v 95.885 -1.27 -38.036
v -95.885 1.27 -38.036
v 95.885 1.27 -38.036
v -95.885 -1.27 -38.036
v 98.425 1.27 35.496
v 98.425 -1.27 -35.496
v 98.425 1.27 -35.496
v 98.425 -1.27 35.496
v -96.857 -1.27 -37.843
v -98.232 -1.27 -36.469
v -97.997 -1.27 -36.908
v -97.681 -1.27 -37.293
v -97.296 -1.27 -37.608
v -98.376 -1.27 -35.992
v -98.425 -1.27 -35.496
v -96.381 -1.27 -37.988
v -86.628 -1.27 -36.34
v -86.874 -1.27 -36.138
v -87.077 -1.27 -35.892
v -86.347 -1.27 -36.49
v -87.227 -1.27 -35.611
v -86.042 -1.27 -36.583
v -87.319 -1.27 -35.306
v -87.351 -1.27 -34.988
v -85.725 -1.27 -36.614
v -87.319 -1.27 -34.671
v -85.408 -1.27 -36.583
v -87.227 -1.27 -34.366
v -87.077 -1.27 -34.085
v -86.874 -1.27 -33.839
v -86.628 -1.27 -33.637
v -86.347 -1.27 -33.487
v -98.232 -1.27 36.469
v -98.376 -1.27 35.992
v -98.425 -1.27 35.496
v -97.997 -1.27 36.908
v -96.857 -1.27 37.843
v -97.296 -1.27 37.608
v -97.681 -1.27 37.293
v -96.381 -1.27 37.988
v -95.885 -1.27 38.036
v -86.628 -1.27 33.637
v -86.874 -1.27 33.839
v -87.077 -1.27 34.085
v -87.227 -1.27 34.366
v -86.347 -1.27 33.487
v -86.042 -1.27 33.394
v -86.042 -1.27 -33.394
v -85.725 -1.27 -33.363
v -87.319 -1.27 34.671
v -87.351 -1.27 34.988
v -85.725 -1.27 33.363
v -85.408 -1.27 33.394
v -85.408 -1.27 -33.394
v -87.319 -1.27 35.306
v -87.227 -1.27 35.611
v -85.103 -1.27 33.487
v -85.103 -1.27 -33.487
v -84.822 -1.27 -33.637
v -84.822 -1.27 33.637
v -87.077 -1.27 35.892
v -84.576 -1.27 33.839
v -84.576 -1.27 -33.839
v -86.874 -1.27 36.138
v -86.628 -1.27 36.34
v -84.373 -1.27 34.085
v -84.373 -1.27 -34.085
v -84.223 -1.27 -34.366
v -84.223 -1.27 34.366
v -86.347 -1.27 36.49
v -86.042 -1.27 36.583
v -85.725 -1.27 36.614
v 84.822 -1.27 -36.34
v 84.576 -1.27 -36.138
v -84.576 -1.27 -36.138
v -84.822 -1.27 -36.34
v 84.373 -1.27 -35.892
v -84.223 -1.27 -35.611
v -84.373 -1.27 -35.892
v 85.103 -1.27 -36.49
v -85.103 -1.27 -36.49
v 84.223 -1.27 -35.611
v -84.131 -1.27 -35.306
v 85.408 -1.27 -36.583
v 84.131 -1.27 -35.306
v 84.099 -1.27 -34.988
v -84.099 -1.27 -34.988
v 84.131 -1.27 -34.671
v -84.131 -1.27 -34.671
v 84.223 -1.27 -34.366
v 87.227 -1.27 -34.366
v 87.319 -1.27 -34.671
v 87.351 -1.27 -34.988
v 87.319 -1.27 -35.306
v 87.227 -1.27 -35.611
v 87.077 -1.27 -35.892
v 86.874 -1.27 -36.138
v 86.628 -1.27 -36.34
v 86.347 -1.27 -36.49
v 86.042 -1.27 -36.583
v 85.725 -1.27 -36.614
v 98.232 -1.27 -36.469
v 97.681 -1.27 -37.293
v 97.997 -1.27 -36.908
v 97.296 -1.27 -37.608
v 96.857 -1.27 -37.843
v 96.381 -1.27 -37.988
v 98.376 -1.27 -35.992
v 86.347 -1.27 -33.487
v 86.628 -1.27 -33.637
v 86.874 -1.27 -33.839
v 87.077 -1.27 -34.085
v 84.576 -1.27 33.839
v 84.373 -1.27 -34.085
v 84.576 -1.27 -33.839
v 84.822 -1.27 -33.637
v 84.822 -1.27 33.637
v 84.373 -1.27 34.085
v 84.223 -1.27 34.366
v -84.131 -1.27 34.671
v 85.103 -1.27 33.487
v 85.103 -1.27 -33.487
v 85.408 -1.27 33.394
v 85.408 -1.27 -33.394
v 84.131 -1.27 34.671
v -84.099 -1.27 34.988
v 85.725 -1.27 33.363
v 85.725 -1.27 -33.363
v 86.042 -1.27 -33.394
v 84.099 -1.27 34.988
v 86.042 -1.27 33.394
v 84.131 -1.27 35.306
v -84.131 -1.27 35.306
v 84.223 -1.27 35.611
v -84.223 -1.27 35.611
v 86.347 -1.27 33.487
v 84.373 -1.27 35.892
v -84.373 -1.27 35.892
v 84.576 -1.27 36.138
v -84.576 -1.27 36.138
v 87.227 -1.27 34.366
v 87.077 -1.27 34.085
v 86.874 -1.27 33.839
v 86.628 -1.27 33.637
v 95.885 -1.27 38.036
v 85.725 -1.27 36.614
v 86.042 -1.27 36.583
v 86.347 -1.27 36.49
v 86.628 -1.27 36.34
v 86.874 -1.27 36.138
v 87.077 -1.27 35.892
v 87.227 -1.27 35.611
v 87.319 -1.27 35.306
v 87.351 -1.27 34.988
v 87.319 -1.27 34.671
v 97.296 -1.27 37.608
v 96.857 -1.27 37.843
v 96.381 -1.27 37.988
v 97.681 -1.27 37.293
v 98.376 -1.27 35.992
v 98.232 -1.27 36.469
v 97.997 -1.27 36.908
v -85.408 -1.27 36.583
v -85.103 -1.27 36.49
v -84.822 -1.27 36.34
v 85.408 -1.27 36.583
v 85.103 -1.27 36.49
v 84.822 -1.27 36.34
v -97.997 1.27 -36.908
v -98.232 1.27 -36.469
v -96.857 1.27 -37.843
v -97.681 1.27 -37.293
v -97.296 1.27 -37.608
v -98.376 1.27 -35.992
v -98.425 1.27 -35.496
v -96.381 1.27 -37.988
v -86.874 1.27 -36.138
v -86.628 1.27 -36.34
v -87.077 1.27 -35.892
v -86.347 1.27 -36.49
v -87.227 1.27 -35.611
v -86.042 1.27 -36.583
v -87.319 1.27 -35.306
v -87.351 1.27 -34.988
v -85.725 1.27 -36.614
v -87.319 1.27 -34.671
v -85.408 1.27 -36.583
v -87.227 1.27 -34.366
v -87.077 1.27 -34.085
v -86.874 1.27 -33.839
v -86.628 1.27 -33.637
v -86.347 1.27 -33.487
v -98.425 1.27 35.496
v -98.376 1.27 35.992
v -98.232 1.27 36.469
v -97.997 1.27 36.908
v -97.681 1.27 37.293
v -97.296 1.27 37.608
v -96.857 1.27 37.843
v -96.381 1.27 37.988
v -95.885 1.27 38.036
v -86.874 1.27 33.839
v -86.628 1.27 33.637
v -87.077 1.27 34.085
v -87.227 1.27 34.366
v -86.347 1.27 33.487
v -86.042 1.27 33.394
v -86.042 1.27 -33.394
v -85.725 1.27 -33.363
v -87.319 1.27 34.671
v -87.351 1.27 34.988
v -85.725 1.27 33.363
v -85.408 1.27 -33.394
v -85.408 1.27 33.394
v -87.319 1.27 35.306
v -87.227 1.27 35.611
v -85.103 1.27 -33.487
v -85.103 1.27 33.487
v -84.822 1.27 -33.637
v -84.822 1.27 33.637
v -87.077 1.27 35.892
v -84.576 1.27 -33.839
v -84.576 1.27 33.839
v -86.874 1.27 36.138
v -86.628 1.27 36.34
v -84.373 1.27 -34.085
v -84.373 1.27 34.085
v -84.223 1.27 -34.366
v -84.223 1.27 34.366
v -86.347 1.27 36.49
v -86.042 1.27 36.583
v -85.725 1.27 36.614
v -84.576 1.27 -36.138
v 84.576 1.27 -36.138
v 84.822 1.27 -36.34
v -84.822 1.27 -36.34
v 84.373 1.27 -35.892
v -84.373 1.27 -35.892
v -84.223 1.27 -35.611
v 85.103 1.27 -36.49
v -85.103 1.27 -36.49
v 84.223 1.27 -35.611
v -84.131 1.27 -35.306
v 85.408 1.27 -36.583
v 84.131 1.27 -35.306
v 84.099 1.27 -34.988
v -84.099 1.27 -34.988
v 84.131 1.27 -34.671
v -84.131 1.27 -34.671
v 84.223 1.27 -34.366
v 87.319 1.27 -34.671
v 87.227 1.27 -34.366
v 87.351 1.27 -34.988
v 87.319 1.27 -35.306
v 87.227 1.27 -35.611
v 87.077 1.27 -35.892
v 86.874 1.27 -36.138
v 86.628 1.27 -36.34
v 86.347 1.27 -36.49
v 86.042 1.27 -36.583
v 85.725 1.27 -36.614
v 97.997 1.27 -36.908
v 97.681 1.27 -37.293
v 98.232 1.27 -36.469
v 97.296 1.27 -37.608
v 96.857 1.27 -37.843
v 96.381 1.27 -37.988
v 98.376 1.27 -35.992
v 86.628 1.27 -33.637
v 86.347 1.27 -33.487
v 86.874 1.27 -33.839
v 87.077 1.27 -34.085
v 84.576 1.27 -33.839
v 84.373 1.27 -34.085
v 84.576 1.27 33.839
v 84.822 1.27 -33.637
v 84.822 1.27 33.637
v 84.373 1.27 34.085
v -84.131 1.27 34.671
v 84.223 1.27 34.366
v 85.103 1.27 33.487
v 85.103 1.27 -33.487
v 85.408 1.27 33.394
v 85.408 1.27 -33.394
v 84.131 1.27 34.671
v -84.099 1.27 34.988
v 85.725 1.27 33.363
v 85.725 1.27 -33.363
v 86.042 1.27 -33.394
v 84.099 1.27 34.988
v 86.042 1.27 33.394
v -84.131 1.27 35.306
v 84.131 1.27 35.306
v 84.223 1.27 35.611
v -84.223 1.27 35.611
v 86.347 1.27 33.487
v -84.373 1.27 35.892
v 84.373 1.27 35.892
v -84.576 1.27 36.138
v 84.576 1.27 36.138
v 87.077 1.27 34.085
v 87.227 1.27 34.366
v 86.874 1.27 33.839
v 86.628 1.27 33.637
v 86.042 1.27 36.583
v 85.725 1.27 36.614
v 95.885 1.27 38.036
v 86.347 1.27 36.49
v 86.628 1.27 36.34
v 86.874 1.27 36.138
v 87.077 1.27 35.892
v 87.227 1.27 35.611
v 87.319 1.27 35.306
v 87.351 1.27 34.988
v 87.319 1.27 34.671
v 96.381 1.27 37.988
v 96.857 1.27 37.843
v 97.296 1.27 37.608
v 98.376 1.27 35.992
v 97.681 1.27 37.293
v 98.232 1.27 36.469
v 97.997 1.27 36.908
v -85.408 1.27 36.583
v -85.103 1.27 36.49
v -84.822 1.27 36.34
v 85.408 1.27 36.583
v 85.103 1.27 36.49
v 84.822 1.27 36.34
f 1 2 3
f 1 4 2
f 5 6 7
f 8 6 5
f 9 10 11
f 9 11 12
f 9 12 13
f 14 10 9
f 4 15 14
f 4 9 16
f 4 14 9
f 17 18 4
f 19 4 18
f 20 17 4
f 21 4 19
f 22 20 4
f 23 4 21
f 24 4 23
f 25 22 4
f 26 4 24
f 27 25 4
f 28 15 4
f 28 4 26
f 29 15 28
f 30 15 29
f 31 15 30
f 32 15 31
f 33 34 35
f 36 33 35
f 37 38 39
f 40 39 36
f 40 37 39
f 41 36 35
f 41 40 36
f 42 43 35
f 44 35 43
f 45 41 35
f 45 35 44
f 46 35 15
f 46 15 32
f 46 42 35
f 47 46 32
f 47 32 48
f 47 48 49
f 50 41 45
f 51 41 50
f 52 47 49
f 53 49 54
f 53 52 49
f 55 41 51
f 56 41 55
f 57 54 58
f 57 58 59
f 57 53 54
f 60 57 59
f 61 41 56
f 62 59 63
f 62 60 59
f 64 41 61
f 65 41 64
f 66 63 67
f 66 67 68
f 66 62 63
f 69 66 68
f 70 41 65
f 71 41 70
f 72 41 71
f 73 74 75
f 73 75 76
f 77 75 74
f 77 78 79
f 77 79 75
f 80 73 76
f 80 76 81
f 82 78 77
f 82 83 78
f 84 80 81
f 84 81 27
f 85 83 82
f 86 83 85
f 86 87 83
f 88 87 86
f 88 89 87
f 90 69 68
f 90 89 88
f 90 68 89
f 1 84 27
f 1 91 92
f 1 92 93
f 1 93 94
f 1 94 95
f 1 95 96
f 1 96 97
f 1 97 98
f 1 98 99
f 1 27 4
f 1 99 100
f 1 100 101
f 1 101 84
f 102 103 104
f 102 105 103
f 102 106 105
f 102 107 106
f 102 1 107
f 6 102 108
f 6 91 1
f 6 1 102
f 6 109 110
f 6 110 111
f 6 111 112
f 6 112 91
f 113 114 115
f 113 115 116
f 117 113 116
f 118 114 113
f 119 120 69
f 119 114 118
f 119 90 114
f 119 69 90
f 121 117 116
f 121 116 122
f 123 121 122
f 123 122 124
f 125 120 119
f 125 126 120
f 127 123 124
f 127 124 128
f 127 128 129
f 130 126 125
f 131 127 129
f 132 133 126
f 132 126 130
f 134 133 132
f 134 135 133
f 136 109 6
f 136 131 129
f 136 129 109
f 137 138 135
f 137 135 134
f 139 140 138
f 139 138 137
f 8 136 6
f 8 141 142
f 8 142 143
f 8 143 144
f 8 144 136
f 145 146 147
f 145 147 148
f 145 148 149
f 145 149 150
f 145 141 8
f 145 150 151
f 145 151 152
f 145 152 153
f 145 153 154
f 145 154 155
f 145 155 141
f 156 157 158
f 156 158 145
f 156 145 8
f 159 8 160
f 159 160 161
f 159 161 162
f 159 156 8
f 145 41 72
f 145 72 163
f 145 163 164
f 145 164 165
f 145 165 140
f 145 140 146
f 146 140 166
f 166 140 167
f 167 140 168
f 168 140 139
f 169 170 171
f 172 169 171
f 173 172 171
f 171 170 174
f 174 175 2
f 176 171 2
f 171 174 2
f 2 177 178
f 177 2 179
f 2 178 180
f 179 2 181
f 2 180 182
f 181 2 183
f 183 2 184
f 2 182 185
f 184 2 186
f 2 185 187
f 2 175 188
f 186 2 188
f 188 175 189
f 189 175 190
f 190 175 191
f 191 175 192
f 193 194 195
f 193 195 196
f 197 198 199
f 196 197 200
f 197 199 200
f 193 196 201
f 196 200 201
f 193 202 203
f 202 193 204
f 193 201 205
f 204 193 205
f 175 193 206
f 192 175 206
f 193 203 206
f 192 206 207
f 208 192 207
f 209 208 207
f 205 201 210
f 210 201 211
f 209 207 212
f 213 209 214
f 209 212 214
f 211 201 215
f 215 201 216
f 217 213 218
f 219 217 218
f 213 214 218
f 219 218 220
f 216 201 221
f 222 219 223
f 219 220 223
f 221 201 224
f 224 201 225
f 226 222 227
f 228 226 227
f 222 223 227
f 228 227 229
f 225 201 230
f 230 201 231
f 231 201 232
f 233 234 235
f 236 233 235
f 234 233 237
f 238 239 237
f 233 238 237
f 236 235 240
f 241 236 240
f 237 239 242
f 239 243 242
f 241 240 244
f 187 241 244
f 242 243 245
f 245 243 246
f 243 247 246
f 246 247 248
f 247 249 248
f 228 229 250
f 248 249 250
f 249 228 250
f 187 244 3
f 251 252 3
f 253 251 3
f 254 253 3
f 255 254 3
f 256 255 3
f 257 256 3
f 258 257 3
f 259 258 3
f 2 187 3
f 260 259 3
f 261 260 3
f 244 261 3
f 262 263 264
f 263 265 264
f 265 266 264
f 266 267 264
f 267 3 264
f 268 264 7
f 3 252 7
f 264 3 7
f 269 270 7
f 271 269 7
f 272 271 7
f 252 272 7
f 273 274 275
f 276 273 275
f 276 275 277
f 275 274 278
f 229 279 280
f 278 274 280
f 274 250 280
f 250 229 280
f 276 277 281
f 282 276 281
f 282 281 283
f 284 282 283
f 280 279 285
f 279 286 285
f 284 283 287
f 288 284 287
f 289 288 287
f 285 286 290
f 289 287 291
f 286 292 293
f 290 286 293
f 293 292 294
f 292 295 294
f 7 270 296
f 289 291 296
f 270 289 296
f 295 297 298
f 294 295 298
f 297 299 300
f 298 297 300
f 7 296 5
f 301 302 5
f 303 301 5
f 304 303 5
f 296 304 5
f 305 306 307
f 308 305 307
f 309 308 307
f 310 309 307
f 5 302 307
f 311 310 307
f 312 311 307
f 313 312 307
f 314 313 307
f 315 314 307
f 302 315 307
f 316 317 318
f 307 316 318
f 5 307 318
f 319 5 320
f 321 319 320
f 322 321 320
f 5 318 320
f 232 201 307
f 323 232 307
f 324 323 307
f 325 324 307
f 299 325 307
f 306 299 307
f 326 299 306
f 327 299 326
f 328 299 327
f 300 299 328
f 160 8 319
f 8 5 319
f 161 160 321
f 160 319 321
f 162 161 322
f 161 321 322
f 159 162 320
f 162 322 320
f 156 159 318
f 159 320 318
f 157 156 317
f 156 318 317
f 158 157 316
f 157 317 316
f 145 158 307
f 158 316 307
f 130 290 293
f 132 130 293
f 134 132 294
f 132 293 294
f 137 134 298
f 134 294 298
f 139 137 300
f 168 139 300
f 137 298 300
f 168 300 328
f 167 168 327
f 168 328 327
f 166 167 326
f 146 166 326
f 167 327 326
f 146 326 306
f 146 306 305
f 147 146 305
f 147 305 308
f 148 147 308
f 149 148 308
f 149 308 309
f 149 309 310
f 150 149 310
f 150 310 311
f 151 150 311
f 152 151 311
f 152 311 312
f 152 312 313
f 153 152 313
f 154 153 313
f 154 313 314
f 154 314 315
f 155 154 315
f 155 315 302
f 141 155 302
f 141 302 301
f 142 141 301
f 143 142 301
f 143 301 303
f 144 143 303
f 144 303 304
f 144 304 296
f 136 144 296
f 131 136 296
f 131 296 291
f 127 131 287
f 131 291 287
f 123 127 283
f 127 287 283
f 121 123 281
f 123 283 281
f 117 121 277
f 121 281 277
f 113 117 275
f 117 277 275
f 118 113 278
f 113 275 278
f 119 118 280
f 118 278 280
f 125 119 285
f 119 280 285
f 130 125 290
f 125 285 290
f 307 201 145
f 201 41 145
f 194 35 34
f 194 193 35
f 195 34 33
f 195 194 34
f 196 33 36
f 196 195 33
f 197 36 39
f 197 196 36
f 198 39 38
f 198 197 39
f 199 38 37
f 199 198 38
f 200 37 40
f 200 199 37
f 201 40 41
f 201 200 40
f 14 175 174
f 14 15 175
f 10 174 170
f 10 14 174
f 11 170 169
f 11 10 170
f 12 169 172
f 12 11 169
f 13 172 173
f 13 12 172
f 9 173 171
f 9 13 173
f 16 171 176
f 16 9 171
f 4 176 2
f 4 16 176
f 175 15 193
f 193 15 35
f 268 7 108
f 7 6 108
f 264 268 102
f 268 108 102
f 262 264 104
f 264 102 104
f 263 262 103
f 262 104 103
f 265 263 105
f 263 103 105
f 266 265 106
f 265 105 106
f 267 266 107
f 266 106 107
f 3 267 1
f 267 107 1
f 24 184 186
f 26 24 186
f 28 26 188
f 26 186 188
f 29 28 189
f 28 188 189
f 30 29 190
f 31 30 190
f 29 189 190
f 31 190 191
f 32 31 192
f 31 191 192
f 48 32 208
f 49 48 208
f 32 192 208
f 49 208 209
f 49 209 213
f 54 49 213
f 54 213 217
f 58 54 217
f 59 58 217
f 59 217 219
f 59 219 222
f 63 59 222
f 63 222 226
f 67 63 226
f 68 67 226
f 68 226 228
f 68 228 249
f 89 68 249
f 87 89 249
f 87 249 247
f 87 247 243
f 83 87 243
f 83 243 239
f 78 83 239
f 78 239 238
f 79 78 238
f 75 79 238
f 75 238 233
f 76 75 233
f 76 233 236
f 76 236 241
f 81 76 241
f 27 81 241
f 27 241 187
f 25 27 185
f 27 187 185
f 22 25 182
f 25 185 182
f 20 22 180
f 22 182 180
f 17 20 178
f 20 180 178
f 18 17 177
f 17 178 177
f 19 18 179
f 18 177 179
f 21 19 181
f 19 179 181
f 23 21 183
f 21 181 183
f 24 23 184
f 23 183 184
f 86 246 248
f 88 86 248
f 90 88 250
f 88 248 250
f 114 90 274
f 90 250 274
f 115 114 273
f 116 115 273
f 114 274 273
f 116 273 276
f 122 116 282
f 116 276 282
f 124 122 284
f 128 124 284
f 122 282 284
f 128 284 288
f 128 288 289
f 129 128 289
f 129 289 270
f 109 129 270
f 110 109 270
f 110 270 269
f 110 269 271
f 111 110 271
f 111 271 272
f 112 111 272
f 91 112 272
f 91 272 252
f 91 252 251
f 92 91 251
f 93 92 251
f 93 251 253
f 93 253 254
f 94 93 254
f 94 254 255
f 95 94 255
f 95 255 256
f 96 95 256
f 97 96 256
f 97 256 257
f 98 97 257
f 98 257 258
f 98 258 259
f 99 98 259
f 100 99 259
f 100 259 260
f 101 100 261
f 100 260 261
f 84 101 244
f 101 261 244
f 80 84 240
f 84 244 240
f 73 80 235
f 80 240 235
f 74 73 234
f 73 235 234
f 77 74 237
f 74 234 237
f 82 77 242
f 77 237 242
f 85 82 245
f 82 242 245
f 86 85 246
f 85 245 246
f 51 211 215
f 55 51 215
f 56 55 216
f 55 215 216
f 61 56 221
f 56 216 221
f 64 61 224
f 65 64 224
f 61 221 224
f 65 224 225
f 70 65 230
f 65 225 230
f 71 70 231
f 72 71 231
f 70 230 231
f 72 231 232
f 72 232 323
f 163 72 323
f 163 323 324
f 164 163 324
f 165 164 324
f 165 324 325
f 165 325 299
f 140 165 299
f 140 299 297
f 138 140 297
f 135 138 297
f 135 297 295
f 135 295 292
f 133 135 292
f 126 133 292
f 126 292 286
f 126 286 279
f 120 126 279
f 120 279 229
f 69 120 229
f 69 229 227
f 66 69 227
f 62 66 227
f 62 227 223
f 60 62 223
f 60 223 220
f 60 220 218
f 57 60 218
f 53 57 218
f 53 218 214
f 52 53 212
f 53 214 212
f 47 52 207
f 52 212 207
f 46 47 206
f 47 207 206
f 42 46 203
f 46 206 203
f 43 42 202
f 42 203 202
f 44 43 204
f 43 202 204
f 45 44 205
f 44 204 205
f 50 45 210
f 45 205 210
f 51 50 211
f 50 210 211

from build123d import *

# Parameters (mm, degrees)
F0_W     = 196.85
F0_H     = 76.073
F1_DEPTH = 1.27
F2_R     = 2.54
F4_D     = 3.2512


with BuildPart() as f1:
    # F0 (on Front) → F1 (new body, symmetric)
    with BuildSketch(Plane.XZ):
        Rectangle(F0_W, F0_H)
    extrude(amount=F1_DEPTH, both=True)

    # F2
    f2_edges = [f1.edges().sort_by_distance(p)[0] for p in [
        (-98.425, 0, 38.0365),
        (-98.425, 0, -38.0365),
        (98.425, 0, -38.0365),
        (98.425, 0, 38.0365),
    ]]
    fillet(f2_edges, radius=F2_R)

    # F4 (through all)
    with Locations(Plane.XZ.offset(1.27)):
        with Locations((85.725, 34.9885), (85.725, -34.9885), (-85.725, -34.9885), (-85.725, 34.9885)):
            Hole(F4_D / 2)


solid = f1.part
